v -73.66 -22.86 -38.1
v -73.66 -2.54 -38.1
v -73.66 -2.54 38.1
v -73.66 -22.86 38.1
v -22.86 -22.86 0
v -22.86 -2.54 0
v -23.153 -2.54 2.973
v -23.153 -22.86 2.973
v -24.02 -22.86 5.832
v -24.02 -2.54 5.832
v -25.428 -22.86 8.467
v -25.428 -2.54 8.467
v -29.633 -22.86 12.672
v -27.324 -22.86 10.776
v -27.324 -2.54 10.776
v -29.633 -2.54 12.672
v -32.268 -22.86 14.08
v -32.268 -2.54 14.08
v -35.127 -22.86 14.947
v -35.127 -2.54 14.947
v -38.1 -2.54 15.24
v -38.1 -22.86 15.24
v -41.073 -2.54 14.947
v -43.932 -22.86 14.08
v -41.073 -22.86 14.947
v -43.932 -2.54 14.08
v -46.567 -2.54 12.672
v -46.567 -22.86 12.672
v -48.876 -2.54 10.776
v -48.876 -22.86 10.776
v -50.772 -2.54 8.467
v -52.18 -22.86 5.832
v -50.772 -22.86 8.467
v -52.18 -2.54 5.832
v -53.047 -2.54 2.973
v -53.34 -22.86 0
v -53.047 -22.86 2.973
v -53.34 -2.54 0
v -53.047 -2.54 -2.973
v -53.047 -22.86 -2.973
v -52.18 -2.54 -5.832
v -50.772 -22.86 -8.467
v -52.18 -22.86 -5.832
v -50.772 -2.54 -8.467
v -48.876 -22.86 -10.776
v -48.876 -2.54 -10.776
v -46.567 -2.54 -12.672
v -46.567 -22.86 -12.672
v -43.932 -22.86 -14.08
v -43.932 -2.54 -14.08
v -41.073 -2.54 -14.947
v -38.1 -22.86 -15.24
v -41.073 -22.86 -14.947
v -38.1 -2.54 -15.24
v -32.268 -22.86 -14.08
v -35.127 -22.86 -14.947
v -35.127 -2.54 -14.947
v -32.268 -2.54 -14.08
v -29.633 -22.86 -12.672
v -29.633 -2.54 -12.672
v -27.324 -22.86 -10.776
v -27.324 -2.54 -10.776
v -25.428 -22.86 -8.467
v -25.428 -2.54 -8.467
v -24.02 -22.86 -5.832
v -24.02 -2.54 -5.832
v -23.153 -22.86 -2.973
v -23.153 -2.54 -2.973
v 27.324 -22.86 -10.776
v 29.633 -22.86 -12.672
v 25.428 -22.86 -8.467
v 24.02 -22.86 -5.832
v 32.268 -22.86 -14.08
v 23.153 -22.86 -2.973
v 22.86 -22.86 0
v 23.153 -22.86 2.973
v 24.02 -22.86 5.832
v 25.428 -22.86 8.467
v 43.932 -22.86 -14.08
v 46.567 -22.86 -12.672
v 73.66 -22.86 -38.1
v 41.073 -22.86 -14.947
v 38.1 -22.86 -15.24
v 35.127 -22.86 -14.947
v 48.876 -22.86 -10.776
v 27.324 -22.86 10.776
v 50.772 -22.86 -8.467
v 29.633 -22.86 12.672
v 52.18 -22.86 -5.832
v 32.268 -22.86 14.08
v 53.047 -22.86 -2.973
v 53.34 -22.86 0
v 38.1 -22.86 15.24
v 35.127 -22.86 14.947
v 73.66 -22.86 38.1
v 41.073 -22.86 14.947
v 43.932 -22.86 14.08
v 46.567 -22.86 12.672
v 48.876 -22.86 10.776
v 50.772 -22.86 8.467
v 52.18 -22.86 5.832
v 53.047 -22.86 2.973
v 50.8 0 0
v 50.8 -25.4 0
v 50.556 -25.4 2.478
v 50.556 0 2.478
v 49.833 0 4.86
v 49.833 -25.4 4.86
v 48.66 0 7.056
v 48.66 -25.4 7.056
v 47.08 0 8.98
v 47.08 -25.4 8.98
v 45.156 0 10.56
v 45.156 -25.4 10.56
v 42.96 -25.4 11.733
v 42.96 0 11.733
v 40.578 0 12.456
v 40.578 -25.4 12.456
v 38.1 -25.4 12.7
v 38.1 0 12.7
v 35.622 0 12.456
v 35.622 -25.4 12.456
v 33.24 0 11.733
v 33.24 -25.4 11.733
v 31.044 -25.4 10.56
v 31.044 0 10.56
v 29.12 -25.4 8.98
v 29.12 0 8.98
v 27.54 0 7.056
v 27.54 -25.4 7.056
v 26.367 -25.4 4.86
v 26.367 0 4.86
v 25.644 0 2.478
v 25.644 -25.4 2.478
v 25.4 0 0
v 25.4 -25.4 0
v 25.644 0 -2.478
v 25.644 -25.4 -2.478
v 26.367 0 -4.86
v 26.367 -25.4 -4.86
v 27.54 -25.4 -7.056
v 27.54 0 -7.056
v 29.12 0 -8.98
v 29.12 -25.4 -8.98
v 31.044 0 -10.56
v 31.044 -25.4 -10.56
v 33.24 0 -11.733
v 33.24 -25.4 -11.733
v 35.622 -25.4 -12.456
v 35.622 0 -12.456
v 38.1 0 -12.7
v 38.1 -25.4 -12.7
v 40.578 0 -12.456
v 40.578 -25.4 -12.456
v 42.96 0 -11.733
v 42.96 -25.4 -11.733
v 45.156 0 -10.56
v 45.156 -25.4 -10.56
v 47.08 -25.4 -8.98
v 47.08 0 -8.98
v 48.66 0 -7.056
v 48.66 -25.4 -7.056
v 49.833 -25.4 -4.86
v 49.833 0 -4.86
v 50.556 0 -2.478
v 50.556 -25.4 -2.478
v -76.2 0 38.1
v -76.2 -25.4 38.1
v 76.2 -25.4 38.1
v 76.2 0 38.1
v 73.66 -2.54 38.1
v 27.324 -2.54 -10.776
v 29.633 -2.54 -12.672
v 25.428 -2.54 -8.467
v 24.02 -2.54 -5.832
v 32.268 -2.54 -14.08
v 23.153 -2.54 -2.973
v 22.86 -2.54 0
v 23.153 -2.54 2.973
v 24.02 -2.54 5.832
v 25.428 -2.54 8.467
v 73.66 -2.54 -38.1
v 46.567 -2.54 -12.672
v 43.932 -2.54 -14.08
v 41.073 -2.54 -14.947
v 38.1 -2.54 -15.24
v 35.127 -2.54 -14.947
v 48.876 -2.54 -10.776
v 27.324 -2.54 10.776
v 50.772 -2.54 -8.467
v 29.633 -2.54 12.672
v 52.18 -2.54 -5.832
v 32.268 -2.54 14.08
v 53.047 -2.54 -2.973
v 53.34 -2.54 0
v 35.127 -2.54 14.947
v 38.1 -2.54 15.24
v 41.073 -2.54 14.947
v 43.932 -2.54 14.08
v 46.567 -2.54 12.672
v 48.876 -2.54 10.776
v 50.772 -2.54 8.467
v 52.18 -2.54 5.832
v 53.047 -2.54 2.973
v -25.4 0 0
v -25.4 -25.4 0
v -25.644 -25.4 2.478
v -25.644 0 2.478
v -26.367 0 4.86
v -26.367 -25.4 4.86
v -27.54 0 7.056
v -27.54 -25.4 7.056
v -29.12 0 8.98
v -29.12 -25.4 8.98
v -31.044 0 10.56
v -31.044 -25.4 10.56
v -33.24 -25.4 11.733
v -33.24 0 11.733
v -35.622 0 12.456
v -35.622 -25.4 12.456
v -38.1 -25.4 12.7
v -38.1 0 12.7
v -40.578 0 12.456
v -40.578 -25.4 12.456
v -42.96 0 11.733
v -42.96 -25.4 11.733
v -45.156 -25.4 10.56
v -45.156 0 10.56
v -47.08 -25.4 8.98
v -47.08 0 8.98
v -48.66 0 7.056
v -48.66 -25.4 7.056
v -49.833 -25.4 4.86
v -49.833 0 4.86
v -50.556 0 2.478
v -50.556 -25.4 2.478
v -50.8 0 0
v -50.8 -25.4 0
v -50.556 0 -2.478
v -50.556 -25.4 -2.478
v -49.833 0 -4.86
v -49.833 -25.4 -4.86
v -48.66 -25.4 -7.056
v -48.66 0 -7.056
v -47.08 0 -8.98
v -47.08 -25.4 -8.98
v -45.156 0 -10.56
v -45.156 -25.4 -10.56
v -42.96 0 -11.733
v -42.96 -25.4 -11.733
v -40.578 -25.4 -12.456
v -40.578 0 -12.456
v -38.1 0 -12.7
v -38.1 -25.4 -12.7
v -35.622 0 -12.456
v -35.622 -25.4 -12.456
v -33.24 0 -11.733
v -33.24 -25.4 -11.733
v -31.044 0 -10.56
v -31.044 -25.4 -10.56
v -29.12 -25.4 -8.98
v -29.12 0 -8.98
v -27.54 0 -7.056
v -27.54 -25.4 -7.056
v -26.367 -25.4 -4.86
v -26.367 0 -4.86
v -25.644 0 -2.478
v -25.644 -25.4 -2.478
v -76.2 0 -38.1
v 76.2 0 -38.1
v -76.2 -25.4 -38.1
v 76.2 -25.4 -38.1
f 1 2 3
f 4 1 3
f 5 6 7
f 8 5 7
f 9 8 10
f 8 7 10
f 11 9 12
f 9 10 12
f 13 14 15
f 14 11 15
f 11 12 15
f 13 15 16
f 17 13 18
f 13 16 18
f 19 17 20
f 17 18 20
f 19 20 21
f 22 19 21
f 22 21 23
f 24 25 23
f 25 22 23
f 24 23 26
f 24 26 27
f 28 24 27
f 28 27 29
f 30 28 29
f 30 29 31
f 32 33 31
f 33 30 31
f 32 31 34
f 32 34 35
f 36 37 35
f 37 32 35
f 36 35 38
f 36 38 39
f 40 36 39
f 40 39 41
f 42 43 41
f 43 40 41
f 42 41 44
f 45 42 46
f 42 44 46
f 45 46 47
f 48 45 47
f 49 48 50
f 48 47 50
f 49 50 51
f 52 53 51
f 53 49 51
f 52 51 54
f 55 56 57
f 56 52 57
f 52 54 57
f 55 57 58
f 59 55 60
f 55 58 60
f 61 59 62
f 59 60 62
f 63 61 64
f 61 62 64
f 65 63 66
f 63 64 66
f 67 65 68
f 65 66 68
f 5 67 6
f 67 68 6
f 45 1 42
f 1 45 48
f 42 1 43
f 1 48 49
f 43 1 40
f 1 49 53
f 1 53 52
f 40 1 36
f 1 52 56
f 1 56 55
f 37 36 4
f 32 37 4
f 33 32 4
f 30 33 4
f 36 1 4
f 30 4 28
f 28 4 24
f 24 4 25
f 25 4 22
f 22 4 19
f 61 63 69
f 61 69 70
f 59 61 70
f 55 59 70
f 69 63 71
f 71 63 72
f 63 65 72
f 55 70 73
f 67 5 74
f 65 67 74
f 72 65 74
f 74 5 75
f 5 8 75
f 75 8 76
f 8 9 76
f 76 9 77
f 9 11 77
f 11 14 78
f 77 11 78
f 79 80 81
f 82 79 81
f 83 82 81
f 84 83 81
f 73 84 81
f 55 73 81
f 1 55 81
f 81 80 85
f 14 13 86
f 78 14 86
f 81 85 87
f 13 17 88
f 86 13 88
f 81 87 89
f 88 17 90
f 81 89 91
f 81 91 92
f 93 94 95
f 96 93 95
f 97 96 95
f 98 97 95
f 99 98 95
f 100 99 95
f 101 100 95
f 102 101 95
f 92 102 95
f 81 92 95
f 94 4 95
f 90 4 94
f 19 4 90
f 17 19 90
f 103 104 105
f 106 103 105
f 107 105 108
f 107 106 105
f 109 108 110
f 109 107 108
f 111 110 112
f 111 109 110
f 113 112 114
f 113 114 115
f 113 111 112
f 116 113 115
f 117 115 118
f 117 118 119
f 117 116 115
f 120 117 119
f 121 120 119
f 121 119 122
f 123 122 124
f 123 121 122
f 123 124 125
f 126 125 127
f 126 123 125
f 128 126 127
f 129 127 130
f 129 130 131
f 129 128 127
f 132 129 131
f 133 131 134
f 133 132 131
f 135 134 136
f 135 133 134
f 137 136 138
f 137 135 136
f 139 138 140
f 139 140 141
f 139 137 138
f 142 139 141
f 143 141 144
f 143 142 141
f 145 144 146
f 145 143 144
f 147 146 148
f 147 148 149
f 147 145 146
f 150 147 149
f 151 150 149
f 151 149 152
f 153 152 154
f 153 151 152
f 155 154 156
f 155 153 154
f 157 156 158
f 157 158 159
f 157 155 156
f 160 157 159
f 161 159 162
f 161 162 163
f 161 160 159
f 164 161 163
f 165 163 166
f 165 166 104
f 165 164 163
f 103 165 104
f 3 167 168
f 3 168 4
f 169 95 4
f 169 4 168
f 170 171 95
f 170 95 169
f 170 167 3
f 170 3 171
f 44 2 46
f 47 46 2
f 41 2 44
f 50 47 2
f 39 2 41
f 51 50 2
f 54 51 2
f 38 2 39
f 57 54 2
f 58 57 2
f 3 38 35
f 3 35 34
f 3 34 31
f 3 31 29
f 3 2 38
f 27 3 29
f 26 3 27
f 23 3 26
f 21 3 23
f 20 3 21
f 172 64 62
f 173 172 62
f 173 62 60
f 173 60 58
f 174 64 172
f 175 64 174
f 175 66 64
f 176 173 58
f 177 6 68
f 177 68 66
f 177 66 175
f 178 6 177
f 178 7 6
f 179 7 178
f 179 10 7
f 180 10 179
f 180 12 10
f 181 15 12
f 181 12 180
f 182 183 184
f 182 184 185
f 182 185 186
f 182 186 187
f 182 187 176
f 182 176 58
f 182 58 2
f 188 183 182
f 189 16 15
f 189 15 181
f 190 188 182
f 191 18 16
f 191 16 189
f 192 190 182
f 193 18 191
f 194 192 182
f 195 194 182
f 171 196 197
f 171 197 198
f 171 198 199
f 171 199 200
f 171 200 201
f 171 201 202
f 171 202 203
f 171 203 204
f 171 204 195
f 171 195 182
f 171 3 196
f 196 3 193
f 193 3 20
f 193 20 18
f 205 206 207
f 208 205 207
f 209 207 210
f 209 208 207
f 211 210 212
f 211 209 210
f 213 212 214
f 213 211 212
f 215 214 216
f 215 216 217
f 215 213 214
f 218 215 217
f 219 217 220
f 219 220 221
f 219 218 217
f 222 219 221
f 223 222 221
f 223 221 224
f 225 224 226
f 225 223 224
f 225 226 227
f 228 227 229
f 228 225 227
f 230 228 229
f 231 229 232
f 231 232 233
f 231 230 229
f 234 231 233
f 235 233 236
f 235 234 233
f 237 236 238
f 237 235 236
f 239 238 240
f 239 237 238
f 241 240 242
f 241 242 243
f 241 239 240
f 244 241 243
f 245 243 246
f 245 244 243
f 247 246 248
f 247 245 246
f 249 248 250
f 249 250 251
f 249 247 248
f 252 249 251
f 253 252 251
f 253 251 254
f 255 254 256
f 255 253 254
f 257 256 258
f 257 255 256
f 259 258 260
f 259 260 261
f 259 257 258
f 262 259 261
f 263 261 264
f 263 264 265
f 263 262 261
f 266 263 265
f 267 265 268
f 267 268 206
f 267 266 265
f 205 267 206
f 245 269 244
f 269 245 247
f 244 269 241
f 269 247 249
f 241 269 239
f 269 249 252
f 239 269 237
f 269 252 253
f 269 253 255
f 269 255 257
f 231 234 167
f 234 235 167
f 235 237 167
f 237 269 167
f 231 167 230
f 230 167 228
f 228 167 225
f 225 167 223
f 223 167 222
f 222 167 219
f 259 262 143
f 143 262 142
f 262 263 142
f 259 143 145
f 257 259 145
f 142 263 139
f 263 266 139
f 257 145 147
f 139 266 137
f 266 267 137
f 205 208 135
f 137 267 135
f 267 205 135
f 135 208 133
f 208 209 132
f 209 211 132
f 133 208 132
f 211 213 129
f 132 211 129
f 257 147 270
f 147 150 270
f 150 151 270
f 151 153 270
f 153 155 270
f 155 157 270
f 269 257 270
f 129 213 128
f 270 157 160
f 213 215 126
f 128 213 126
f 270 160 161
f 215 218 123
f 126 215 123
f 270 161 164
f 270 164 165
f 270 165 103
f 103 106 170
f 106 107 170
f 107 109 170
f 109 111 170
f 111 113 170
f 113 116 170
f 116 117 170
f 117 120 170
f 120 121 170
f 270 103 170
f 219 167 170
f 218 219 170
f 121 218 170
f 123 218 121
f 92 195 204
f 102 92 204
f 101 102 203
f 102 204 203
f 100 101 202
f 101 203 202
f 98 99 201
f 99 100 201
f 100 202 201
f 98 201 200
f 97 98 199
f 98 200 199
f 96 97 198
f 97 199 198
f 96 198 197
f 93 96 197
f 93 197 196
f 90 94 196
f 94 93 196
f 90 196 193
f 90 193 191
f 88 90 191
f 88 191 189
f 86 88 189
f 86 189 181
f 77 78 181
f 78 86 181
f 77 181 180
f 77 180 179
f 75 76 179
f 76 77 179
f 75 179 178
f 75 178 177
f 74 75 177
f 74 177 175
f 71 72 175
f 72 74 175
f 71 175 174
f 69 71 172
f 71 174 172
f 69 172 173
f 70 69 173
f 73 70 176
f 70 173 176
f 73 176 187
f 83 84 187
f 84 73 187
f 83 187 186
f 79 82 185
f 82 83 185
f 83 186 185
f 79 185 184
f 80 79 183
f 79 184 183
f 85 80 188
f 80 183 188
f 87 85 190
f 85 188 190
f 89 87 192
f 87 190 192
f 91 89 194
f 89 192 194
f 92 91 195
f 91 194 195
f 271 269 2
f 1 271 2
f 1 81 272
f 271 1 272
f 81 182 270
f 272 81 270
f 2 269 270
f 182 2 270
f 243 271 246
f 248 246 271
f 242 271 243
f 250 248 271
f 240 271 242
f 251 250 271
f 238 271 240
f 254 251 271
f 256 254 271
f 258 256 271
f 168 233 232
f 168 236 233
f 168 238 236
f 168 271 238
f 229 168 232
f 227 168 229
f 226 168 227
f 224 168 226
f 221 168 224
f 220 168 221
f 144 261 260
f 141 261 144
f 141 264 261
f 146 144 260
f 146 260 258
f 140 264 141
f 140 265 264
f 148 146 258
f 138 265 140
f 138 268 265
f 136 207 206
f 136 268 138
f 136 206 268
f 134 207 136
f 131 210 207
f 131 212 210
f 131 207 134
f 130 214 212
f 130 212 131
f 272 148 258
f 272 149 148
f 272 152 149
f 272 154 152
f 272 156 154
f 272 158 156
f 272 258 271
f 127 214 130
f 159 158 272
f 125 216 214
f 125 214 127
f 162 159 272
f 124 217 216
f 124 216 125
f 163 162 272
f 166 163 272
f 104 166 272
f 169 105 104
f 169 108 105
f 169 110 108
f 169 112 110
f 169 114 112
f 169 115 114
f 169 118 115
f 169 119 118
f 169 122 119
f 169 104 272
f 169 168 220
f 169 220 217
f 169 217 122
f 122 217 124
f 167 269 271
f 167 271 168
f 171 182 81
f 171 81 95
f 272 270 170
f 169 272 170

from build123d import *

# Parameters (mm, degrees)
F0_W     = 152.4
F0_H     = 76.2
F0_R     = 12.7
F1_DEPTH = 25.4
F2_T     = -2.54


with BuildPart() as f1:
    # F0 (on Front) → F1 (new body)
    with BuildSketch(Plane.XZ):
        Rectangle(F0_W, F0_H)
        with Locations((-38.1, 0)):
            Circle(F0_R, mode=Mode.SUBTRACT)
        with Locations((38.1, 0)):
            Circle(F0_R, mode=Mode.SUBTRACT)
    extrude(amount=F1_DEPTH)

    # F2
    f2_openings = [f1.faces().sort_by_distance(p)[0] for p in [
        (0, -12.7, 38.1),
        (0, -12.7, -38.1),
    ]]
    offset(amount=F2_T, openings=f2_openings)


solid = f1.part
